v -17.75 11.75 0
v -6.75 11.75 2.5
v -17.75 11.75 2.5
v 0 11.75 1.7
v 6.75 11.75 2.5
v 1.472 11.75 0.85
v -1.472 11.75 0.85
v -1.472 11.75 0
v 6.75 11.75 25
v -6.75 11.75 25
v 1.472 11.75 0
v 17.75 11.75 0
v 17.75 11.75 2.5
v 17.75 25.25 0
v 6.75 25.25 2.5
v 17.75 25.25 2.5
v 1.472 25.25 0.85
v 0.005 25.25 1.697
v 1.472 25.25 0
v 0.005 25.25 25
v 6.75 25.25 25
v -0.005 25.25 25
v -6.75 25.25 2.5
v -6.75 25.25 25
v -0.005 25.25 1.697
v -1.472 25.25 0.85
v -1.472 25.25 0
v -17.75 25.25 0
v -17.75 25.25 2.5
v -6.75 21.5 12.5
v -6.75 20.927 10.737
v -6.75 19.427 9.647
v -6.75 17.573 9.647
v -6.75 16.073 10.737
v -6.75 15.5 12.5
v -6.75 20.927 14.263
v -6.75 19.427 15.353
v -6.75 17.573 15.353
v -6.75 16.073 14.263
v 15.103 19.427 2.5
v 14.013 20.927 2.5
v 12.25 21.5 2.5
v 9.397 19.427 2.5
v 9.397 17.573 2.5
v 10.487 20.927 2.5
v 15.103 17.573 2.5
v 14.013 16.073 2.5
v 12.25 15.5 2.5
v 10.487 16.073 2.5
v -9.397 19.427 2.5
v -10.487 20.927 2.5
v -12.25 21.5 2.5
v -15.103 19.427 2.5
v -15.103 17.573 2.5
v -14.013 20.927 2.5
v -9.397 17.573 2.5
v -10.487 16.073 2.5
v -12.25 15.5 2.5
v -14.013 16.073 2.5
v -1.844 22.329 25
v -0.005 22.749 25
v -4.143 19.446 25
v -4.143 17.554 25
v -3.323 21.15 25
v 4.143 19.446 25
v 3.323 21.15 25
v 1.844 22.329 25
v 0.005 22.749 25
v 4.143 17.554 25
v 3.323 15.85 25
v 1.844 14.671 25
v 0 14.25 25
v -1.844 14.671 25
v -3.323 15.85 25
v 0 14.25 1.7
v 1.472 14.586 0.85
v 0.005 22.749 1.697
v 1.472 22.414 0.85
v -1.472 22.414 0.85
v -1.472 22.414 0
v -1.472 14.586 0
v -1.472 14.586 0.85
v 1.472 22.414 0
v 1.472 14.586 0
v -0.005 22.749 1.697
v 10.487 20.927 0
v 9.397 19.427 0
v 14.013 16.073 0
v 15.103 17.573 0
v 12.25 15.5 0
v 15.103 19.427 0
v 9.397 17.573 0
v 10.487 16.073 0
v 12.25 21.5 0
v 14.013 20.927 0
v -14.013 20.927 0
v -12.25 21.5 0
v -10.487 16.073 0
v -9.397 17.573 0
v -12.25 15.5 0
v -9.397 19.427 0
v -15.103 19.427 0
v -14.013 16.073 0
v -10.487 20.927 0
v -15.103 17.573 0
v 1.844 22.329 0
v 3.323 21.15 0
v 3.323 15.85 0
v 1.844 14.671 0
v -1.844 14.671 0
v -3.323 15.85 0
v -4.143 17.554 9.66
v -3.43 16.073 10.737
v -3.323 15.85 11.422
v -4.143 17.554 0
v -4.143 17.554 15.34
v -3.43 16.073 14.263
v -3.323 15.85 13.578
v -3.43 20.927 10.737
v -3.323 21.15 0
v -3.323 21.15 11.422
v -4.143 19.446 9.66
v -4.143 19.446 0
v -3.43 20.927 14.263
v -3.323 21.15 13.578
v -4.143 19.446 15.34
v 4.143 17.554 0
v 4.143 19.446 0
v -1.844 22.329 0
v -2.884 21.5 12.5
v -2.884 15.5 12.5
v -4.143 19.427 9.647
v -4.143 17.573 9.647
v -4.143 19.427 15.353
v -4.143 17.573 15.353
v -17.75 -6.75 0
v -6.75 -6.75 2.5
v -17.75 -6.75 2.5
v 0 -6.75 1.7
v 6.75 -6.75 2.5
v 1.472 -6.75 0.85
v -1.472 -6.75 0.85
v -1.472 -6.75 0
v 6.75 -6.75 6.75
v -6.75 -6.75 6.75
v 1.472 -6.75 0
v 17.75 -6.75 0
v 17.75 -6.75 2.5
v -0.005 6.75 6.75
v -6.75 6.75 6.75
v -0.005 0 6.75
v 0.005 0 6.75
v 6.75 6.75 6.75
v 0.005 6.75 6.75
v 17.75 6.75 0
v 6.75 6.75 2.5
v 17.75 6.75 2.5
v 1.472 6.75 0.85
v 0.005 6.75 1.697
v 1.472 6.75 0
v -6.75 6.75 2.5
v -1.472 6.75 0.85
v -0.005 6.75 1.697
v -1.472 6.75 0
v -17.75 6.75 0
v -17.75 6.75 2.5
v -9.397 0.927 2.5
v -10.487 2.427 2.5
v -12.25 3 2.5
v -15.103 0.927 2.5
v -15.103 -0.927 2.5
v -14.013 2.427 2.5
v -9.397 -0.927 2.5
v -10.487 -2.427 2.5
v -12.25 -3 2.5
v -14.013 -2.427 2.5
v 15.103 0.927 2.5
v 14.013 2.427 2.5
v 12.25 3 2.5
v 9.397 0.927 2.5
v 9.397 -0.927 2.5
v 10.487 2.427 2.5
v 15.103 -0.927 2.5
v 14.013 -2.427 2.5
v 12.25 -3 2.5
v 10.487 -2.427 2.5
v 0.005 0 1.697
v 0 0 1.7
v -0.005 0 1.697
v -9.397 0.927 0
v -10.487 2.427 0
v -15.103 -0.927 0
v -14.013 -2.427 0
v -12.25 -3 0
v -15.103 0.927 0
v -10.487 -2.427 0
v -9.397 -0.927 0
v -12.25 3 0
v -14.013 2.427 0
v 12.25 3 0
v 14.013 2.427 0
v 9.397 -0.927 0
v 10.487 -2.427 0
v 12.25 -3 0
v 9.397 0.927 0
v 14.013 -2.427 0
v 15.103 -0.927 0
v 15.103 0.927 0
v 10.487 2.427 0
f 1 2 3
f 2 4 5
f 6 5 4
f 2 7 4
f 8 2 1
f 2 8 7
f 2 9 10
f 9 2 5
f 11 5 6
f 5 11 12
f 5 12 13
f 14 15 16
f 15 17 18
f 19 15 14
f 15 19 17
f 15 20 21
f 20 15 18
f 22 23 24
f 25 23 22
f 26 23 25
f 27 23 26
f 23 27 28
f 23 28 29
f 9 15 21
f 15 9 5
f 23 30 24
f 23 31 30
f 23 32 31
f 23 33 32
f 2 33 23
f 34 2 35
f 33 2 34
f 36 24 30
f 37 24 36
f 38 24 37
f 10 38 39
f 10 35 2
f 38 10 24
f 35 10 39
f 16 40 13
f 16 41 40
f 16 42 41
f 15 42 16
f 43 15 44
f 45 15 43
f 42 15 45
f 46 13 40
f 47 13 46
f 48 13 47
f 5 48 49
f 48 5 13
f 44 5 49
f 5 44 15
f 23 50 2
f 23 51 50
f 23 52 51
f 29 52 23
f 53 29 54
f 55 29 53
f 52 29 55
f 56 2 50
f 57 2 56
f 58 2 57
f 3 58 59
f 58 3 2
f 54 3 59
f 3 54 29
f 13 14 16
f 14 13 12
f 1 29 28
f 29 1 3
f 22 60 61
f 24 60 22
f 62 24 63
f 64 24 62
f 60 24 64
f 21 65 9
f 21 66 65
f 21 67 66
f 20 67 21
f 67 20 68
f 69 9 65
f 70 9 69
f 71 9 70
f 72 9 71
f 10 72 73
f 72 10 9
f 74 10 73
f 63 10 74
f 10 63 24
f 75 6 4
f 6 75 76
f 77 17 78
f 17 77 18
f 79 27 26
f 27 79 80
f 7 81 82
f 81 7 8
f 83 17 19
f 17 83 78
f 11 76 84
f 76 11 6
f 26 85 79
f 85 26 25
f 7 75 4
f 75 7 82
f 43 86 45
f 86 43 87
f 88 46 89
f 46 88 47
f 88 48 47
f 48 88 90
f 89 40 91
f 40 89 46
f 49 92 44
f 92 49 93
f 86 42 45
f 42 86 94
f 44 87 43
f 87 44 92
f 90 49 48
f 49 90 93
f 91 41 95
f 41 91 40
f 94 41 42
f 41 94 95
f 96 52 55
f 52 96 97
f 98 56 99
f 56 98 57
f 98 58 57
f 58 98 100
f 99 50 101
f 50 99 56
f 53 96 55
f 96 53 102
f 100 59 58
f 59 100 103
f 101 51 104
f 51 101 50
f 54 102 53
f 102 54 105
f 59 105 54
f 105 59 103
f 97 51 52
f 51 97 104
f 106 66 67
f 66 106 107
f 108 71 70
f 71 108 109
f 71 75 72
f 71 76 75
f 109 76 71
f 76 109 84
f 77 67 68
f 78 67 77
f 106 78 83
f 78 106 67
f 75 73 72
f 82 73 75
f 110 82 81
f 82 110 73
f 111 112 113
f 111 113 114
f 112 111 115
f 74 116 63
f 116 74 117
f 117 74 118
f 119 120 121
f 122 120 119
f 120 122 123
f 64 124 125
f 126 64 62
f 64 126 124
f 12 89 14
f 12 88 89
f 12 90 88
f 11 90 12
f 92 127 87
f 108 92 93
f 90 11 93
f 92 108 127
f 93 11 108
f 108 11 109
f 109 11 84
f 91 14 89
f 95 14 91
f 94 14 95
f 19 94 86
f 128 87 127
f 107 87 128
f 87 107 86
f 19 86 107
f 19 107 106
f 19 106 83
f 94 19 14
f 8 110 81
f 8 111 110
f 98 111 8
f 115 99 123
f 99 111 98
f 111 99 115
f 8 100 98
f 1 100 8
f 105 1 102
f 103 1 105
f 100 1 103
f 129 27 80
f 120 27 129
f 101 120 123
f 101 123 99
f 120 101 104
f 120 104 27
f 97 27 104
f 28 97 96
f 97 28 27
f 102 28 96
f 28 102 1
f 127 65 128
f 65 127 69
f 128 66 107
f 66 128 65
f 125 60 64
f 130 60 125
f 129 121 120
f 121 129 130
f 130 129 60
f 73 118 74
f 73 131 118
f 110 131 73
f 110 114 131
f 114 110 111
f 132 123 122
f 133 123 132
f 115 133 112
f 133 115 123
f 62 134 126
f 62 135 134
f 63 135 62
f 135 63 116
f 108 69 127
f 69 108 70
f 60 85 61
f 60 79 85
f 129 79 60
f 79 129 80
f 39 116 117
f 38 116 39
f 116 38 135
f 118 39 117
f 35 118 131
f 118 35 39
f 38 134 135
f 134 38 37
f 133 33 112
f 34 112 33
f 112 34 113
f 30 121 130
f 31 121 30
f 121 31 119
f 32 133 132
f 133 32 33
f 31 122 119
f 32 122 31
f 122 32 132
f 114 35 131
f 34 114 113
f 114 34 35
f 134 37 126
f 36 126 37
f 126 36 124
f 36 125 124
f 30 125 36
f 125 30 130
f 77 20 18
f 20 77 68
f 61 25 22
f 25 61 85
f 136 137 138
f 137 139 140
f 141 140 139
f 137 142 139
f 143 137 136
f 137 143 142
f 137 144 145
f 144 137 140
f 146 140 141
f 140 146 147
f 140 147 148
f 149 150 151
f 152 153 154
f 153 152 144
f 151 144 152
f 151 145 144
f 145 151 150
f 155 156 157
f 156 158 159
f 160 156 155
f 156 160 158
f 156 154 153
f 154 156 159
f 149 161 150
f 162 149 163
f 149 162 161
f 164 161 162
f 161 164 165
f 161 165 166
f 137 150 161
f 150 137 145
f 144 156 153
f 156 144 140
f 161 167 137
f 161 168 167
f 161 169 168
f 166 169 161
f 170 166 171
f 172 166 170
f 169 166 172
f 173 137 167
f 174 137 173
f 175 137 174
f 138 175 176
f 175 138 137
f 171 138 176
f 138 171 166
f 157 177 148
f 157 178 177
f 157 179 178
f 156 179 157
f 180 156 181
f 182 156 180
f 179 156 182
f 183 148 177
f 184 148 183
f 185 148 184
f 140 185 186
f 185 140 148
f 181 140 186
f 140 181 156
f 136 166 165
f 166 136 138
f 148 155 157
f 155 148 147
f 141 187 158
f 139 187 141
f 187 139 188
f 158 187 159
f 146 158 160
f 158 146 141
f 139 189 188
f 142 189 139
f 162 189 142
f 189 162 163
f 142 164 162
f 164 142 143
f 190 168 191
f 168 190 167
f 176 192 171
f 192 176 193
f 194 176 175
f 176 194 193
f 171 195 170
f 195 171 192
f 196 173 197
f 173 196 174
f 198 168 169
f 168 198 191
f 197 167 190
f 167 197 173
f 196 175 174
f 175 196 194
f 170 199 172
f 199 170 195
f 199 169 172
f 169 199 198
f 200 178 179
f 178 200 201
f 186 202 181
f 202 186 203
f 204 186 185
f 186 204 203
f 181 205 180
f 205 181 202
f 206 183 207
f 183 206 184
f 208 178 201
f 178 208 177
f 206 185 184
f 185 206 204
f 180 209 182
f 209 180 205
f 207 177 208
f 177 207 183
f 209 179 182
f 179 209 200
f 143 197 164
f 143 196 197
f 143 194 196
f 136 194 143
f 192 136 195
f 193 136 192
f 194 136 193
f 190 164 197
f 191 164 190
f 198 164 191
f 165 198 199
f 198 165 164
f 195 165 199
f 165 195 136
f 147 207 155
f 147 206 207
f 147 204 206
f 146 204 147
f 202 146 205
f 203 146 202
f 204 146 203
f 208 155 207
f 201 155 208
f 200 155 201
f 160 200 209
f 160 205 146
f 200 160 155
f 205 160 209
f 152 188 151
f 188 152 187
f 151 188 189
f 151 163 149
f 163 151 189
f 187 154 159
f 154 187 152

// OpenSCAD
// The smallest size of feature we can rely on to not crack.
wall_width = 2.5;

bolt_dia = 6;

// the dia of the bit of the pen that we try to grip.
pen_holder_bottom_id = 8.5;
pen_holder_bottom_od = pen_holder_bottom_id;
// the entire bit that is this dia, plus the actual tip
pen_height = 25;

feedstock_dia = 3;
// How much extra space all around the feedstock fill line?
feedstock_fudge = 0.2;
feedstock_holder_width = max(feedstock_dia+feedstock_fudge*2, pen_holder_bottom_od) + +wall_width*2;

rotate(a=180, v=[0, 1, 0])
 translate([0, feedstock_holder_width+wall_width*2, 0])
  marker_holder(true, false);

marker_holder(false, true);

make_feedstock_holder_top = true;
make_feedstock_holder_bottom = true;

module marker_holder(make_feedstock_holder_top, make_feedstock_holder_bottom) {
 rotate(a=180, v=[1, 0, 0])
 rotate(a=90, v=[0, 0, 1])
 difference () {
  union () {
   // feedstock holder proper
   cube([feedstock_holder_width, feedstock_holder_width, feedstock_holder_width], center=true);

   // Wings to bolt together.
   cube([feedstock_holder_width, feedstock_holder_width+bolt_dia*2+wall_width*4, wall_width*2], center=true);

   // additional height for the marker holder.
   translate([0, 0, pen_height/2])
    cube([feedstock_holder_width, feedstock_holder_width, pen_height], center=true);
  }

  // hole for feedstock
  # translate([-feedstock_holder_width*2, 0, 0])
   rotate(a=90, v=[0, 1, 0])
    cylinder(r=feedstock_dia/2+feedstock_fudge, h=feedstock_holder_width*4);

  // hole for +y bolt
  translate([0, feedstock_holder_width/2 + bolt_dia/2 + wall_width, -feedstock_holder_width])
   cylinder(r=bolt_dia/2, h=feedstock_holder_width*2);

  // hole for -y bolt
  translate([0, -(feedstock_holder_width/2 + bolt_dia/2 + wall_width), -feedstock_holder_width])
   cylinder(r=bolt_dia/2, h=feedstock_holder_width*2);

  // hole for the marker holder
  cylinder(r=pen_holder_bottom_od/2, h=30);

  // bolt for holding in the marker. (should be along x, so we can place several in close vicinity.
  translate([0, 0, pen_height/2])
   rotate(a=90, v=[1, 0, 0])
    cylinder(r=bolt_dia/2, h=30);

  // I hear that adding a very thin cut on the edge of holes can make skeinforge string across them less.
  translate([-40, 0, 0])
   cube([80, 0.01, 80], center=true);

  if (!make_feedstock_holder_top) {
   translate([0, 0, 40])
    cube([80, 80, 80], center=true);
  }

  if (!make_feedstock_holder_bottom) {
   translate([0, 0, -40])
    cube([80, 80, 80], center=true);
  }
 }
}
